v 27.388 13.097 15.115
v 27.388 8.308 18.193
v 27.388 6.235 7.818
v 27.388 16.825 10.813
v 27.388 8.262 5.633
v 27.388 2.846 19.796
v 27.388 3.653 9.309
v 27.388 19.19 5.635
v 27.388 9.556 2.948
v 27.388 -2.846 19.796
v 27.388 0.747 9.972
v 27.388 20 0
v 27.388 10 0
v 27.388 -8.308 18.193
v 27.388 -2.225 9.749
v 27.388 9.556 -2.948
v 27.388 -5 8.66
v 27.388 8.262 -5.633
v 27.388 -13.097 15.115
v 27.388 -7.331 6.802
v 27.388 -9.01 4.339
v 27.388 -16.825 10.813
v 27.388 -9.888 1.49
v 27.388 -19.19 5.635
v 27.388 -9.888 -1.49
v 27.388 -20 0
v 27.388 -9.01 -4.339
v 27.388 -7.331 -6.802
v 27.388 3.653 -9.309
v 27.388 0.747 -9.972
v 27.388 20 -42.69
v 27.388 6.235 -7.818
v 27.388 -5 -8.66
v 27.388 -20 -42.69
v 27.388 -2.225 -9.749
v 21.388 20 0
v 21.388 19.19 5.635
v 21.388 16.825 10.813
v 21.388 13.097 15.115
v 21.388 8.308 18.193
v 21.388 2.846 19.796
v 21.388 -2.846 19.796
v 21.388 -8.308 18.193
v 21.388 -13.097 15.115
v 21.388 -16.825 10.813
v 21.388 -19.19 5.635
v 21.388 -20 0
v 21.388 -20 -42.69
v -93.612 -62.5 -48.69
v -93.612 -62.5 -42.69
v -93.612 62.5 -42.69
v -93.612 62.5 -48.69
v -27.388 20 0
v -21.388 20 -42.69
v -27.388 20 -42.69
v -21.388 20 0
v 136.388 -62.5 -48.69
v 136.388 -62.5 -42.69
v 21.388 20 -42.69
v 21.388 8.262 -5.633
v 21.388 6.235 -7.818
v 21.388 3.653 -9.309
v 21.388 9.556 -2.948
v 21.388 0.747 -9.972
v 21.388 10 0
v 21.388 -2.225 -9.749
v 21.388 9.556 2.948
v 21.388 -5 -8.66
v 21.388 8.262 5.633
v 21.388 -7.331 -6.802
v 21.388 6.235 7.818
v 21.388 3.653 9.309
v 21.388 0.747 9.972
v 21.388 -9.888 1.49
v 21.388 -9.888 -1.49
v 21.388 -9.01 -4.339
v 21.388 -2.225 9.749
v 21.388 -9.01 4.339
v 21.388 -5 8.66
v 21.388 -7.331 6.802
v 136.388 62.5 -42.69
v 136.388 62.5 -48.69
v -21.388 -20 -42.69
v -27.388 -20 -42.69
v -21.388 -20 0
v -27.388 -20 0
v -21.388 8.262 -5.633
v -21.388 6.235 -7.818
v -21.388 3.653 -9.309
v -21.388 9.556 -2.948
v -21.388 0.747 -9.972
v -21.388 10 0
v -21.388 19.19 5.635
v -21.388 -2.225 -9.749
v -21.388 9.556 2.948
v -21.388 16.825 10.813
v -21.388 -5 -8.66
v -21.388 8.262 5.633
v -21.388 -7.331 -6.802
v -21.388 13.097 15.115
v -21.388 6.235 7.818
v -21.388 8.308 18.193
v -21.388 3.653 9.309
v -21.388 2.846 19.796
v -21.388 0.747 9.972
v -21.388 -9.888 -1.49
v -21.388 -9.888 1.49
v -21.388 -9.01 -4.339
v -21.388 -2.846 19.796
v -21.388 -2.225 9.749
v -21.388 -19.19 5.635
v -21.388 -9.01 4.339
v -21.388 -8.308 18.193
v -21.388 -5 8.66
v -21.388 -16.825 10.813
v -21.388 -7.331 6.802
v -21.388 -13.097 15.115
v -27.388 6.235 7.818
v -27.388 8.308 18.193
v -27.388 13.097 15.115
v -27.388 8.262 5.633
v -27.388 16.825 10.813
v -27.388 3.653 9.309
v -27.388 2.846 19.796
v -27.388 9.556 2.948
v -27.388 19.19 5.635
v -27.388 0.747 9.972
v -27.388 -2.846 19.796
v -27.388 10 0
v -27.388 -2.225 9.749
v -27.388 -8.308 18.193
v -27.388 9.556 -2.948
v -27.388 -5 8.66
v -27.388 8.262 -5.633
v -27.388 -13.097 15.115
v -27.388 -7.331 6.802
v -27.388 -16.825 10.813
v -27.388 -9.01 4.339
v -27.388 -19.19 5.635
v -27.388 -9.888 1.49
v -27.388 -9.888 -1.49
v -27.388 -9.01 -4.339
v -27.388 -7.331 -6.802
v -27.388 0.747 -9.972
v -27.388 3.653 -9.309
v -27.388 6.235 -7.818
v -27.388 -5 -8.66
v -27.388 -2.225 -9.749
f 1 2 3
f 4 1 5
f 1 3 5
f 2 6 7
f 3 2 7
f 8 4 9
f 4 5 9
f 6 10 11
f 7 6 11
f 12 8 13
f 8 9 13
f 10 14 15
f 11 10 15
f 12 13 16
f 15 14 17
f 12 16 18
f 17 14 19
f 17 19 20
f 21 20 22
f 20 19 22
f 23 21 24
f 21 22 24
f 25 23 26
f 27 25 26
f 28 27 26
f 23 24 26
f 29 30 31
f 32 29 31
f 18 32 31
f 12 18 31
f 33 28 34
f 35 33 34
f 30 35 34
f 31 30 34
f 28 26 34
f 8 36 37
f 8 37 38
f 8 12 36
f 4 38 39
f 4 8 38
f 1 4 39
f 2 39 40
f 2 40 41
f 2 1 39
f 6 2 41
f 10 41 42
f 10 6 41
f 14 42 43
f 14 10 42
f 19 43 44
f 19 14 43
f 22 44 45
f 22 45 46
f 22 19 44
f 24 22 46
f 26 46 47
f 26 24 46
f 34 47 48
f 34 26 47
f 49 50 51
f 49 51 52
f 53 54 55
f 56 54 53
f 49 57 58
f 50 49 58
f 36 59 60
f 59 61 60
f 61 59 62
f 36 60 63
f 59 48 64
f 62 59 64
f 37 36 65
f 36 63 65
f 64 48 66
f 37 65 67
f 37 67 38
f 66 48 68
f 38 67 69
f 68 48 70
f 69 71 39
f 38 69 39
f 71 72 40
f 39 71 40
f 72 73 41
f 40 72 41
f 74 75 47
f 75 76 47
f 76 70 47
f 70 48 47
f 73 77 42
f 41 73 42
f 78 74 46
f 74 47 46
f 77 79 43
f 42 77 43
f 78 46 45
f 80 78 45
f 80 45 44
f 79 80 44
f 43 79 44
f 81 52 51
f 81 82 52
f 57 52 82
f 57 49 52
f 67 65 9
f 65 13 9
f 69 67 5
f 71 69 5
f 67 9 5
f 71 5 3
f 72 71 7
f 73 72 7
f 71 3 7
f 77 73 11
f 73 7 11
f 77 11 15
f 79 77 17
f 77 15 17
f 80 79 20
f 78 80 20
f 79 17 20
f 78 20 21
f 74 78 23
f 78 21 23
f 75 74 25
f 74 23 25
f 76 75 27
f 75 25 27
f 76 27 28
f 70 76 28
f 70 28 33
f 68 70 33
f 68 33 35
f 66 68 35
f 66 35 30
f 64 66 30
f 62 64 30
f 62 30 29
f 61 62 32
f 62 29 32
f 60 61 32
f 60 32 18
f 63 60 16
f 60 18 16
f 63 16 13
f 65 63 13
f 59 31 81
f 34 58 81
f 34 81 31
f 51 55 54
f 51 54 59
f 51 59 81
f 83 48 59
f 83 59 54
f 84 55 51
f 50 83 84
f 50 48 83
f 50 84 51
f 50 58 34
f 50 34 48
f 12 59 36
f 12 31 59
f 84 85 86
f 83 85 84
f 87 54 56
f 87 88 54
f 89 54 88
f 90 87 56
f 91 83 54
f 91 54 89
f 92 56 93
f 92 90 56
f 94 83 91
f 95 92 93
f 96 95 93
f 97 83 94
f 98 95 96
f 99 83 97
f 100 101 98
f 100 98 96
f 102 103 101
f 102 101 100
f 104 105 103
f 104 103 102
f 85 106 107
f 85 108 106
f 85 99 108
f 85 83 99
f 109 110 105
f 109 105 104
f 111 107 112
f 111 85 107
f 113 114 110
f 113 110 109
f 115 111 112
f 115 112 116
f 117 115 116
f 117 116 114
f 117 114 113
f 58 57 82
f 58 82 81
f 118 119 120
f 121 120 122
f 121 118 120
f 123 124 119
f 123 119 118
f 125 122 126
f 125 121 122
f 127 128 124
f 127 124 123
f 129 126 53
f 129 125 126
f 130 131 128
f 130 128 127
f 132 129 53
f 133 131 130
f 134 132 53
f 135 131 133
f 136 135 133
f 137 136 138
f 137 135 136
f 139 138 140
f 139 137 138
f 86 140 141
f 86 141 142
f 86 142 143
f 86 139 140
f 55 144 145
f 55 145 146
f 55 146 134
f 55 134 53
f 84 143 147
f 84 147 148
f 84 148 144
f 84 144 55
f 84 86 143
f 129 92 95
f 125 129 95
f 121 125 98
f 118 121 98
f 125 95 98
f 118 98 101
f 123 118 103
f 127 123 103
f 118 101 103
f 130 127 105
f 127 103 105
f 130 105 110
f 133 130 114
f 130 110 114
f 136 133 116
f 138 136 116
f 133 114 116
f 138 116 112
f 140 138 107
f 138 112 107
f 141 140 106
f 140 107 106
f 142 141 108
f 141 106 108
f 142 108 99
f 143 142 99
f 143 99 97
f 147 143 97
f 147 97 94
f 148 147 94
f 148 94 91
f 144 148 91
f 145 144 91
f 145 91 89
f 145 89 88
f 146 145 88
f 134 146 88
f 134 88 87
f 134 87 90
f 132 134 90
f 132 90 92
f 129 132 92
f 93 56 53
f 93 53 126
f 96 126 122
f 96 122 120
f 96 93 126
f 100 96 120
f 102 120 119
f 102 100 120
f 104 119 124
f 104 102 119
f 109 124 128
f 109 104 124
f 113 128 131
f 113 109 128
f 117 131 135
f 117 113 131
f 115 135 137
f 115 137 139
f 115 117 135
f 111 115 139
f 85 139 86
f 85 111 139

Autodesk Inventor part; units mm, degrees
ref_plane "YZ Plane" through (0, 0, 0) normal (1, 0, 0) x (0, 1, 0)
ref_plane "XZ Plane" through (0, 0, 0) normal (0, 1, 0) x (-1, 0, 0)
ref_plane "XY Plane" through (0, 0, 0) normal (0, 0, 1) x (1, 0, 0)
sketch "Sketch2" plane through (0, 0, 0) normal (1, 0, 0) x (0, 1, 0)
  line L0 (20, 27.3876) -> (-42.6897, 27.3876)
  line L1 (-42.6897, 21.3876) -> (20, 21.3876)
  line L2 (20, 21.3876) -> (20, 27.3876)
  line L3 (-42.6897, -21.3876) -> (20, -21.3876)
  line L4 (20, -21.3876) -> (20, -27.3876)
  line L5 (20, -27.3876) -> (-42.6897, -27.3876)
  line L6 (-42.6897, -93.6124) -> (-48.6897, -93.6124)
  line L7 (-48.6897, -93.6124) -> (-48.6897, 136.3876)
  line L8 (-48.6897, 136.3876) -> (-42.6897, 136.3876)
  line L9 (-42.6897, 136.3876) -> (-42.6897, 27.3876)
  line L10 (-42.6897, 21.3876) -> (-42.6897, -21.3876)
  line L11 (-42.6897, -27.3876) -> (-42.6897, -93.6124)
  point P0 (0, 0)
  dimension "d3" = 6
  dimension "d5" = 48.6897
  dimension "d6" = 136.3876
  dimension "d7" = 93.6124
  dimension "d9" = 27.3876
  dimension "d10" = 27.3876
  dimension "d11" = 20
extrude "Extrusion1" add sketch "Sketch2" along normal mid plane 125
sketch "Sketch3" plane through (-62.5, -42.6897, 27.3876) normal (0, 0, 1) x (1, 0, 0)
  circle A0 centre (62.5, 42.6897) radius 10
  dimension "d14" = 20
extrude "Extrusion2" cut sketch "Sketch3" against normal through all
sketch "Sketch4" plane through (-62.5, -42.6897, 27.3876) normal (0, 0, 1) x (1, 0, 0)
  circle A0 centre (62.5, 42.6897) radius 10 projected
  line L0 (0, 0) -> (125, 0) projected
  line L1 (125, 62.6897) -> (125, 0) projected
  line L2 (125, 62.6897) -> (0, 62.6897) projected
  line L3 (0, 0) -> (0, 62.6897) projected
  arc A1 (82.5, 42.6897) -> (42.5, 42.6897) centre (62.5, 42.6897) ccw
  line L4 (42.5, 42.6897) -> (42.5, 0)
  line L5 (82.5, 0) -> (82.5, 42.6897)
extrude "Extrusion3" cut sketch "Sketch4" against normal through all contours L3 L2 A1 L4 L0 | L5 A1 L2 L1 L0
move or copy body "Move Body1" bodies to move or copy 1 copy no rotation origin (0, 0, 0) rotation axis (1, 0, 0) rotation angle 90
move or copy body "Move Body2" bodies to move or copy 1 copy no rotation origin (0, 0, 0) rotation axis (0, 0, 1) rotation angle 90
properties part number "Foot"
